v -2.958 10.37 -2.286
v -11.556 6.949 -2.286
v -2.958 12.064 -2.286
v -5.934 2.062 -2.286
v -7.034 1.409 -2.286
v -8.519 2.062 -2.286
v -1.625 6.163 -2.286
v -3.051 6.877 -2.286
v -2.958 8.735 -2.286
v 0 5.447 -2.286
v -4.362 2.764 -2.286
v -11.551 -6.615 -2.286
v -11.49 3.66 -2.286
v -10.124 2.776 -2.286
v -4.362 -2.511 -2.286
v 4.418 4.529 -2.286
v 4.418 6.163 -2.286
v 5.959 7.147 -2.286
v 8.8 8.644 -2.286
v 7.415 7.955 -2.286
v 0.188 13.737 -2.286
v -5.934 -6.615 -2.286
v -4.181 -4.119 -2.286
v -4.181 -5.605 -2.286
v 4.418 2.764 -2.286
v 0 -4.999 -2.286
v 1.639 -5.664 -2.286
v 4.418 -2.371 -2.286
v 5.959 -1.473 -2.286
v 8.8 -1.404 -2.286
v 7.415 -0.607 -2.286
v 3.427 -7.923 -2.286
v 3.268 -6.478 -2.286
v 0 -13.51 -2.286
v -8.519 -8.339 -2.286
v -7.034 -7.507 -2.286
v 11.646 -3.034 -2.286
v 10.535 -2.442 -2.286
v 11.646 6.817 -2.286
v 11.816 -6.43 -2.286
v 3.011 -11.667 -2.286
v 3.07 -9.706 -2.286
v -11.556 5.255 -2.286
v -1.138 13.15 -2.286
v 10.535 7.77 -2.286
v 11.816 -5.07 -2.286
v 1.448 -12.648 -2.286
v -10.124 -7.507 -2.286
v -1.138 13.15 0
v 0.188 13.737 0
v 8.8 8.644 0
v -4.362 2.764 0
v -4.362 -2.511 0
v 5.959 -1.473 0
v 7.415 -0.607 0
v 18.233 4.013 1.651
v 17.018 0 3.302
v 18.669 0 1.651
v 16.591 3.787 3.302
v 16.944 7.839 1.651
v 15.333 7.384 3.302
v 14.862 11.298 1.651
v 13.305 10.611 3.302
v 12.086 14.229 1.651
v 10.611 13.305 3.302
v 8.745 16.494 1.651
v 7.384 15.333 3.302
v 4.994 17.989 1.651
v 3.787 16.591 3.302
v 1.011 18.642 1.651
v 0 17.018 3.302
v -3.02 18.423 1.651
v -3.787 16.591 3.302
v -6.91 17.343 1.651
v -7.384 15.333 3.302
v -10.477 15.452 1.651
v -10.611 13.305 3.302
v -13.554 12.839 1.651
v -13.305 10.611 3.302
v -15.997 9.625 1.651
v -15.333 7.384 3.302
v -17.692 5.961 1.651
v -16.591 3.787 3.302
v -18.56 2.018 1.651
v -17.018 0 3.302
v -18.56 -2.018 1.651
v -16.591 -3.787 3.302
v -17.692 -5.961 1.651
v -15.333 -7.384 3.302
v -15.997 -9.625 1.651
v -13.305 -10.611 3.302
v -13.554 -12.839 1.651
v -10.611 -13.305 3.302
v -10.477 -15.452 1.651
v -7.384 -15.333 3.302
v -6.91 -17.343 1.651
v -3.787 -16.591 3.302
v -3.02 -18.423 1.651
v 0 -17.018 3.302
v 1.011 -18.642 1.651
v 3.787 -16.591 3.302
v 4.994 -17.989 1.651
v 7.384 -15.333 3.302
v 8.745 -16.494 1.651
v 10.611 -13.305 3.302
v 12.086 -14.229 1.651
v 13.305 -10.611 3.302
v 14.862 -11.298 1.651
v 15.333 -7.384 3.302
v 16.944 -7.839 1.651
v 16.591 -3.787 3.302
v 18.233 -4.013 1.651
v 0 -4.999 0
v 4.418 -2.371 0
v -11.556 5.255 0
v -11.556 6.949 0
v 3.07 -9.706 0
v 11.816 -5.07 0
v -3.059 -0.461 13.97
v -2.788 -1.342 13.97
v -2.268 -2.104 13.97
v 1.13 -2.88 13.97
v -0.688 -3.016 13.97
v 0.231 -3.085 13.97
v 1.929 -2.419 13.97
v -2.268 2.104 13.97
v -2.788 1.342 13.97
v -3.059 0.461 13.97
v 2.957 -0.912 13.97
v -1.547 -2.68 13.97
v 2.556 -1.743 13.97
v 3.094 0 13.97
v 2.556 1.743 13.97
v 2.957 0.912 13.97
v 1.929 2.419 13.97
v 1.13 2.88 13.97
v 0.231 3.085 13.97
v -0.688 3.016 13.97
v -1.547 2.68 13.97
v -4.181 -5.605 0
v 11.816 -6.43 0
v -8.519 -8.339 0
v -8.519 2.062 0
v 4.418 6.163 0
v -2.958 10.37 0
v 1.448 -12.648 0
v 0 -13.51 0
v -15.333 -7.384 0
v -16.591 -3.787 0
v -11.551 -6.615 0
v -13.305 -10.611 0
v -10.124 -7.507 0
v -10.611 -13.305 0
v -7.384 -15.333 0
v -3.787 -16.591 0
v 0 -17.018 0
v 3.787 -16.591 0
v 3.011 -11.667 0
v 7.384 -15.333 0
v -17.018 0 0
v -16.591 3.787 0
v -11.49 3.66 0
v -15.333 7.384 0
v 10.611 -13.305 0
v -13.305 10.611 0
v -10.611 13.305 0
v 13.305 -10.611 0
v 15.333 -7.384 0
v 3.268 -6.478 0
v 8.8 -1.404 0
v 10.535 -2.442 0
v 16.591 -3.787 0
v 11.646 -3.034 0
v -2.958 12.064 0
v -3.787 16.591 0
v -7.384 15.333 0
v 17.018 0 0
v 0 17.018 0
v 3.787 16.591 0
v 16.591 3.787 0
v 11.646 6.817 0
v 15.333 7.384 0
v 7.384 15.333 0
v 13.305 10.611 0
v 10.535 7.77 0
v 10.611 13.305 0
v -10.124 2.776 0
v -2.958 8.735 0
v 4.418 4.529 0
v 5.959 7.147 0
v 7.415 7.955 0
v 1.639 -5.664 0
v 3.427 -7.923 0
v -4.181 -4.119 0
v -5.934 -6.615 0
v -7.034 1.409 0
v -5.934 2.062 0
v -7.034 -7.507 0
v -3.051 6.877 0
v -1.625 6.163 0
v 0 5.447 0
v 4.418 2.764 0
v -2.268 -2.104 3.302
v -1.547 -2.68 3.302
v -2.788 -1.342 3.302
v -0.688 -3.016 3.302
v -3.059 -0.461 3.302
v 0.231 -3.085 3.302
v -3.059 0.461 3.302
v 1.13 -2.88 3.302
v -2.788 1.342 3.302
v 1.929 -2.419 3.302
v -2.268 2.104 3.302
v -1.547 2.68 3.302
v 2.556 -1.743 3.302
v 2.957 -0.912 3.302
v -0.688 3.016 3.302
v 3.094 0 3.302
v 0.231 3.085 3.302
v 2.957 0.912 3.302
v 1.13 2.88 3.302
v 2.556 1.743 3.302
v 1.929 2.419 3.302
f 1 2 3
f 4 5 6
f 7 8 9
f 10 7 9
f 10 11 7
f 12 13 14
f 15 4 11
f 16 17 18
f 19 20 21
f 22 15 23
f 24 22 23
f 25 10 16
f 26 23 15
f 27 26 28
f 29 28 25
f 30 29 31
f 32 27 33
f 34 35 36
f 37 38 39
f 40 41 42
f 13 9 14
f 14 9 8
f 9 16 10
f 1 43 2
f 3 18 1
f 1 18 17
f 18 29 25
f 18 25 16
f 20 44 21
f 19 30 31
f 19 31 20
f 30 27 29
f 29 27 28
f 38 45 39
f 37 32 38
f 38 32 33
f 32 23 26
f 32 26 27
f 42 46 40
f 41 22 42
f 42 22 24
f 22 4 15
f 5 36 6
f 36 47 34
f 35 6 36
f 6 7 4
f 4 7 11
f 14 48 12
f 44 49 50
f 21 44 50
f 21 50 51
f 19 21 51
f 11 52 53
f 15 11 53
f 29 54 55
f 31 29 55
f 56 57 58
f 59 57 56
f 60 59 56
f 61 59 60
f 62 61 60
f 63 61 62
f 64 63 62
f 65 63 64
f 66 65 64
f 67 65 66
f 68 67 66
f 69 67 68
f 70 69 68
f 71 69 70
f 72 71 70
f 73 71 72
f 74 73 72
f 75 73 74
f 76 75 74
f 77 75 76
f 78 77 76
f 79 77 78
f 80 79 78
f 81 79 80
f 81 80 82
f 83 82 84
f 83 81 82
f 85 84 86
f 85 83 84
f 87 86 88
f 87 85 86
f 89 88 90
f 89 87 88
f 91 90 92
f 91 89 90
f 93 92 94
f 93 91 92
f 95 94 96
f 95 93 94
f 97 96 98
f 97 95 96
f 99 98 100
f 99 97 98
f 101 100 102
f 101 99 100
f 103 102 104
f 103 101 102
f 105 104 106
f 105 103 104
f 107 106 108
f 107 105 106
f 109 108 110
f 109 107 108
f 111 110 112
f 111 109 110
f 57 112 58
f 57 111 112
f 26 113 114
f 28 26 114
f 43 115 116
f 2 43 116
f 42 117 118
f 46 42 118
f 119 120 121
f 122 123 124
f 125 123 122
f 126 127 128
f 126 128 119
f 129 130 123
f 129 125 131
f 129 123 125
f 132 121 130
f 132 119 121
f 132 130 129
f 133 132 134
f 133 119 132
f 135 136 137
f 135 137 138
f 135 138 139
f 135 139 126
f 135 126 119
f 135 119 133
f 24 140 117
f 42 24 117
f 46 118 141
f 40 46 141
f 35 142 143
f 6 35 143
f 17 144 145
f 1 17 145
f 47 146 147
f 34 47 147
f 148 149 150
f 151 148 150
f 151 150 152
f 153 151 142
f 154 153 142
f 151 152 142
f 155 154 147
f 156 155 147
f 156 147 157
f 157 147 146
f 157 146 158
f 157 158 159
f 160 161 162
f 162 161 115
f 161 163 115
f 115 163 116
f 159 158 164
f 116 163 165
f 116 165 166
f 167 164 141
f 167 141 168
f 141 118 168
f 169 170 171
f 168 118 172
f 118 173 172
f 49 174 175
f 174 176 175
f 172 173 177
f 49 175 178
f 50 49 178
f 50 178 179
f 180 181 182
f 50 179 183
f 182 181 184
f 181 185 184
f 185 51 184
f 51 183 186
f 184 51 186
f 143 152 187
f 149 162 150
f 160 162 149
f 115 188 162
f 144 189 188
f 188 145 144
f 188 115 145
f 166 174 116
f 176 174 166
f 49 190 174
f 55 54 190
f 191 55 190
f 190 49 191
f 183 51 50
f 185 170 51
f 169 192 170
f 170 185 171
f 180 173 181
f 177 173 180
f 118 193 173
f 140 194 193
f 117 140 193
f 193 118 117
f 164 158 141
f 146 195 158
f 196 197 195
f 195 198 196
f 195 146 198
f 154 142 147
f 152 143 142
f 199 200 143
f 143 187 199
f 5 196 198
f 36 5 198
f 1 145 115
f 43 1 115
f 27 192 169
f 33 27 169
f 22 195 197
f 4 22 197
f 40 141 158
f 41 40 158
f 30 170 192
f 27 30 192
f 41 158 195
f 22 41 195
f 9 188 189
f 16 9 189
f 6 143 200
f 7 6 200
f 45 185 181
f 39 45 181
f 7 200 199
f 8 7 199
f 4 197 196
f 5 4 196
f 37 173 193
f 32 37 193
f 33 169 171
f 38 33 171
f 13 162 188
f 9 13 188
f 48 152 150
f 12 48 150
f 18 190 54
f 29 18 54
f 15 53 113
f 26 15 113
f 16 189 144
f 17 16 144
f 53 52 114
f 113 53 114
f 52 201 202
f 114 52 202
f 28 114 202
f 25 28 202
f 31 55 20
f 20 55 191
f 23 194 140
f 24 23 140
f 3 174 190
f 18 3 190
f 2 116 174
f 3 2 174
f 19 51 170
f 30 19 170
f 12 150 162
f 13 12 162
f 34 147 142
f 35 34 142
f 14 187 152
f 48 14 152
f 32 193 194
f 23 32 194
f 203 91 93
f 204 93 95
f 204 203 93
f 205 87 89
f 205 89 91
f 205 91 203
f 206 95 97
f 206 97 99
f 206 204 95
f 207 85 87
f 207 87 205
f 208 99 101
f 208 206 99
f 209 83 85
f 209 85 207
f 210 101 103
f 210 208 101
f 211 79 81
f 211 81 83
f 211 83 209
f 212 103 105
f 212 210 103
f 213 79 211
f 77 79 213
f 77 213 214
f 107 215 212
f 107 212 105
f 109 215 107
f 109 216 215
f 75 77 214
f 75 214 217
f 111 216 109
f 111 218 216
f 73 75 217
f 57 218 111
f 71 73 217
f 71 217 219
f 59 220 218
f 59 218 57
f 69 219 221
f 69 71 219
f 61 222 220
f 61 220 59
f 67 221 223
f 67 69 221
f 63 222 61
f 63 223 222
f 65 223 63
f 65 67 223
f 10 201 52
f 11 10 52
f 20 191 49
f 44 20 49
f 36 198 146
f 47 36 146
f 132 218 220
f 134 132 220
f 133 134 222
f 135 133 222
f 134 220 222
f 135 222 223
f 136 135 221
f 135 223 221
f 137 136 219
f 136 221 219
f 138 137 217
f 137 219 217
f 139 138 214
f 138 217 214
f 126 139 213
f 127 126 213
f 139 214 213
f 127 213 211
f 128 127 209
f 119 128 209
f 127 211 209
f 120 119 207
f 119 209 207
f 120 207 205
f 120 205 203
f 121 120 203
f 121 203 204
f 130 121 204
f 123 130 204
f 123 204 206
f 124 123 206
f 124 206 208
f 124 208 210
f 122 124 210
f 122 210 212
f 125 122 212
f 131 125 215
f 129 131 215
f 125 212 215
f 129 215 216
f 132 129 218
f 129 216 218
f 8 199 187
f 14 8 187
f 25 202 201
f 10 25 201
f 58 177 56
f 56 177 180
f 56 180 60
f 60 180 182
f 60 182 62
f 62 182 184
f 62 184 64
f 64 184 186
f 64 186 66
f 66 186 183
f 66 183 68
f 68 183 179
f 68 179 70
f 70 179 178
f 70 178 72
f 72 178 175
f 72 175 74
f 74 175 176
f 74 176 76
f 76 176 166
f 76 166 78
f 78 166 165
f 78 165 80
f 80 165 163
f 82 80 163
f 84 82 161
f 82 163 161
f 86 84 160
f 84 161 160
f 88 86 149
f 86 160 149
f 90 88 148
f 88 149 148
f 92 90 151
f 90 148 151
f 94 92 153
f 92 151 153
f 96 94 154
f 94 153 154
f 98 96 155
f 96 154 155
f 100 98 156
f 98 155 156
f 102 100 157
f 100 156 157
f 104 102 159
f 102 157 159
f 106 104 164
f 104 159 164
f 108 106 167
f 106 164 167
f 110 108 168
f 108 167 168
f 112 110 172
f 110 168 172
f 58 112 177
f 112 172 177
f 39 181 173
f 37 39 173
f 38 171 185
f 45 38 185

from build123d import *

# Parameters (mm, degrees)
F0_R     = 19.05
F1_DEPTH = 3.302
F2_R     = 3.0940455734
F3_DEPTH = 10.668
F4_SIZE  = 2.032
F7_DEPTH = 2.286


# Not quite as in the source:
# - a fillet or chamfer that OpenCascade refuses, or shapes differently, is made with other operations: its cross-section is extruded or revolved along the edge and cut away or added


with BuildPart() as f1:
    # F0 (on Top) → F1 (new body)
    with BuildSketch(Plane.XY):
        Circle(F0_R)
    extrude(amount=F1_DEPTH)

    # F2 (on face) → F3 (join)
    with BuildSketch(Plane.XY.offset(3.302)):
        Circle(F2_R)
    extrude(amount=F3_DEPTH)

    # F4
    f4_edges = [f1.edges().sort_by_distance(p)[0] for p in [
        (-19.05, 0, 3.302),
    ]]
    chamfer(f4_edges, length=F4_SIZE)

    # F5: chamfer of 2.032 on 1 edges, made by hand

    # F5_s1 → F5_t2 (revolve, cut)
    with BuildSketch(Plane.XZ):
        Polygon((19.05, 2.032), (17.018, 0), (19.05, 0), align=None)
    revolve(axis=Axis((0, 0, 0), (0, 0, 1)), mode=Mode.SUBTRACT)

    # F6 (on face) → F7 (join)
    with BuildSketch(Plane(origin=(0, 0, 0), x_dir=(1, 0, 0), z_dir=(0, 0, -1))):
        Polygon((-10.1241571829, 7.50669837), (-11.5505903959, 6.6151777282), (-11.4901715756, -3.6598756731), (-2.9577685054, -8.7351842692), (4.4179176912, -4.5286850072), (4.4179176912, -6.1632911675), (-2.9577685054, -10.3697904294), (-11.5558920335, -5.255389493), (-11.5558920335, -6.9493146705), (-2.9577685054, -12.0637156069), (5.9589991364, -7.1465903893), (5.9589991364, 1.4732169604), (7.414681837, 0.6073367549), (7.414681837, -7.955128327), (-1.1376237962, -13.150122948), (0.1876302122, -13.7365777045), (8.8004540583, -8.6443684995), (8.8004540583, 1.404343208), (1.6391712, 5.6640716984), (3.2676828559, 6.4783277921), (10.5352541432, 2.4422151037), (10.5352541432, -7.7702743001), (11.6456285548, -6.8170730956), (11.6456285548, 3.0340532394), (3.4269623458, 7.9227425003), (-4.1806832887, 4.1189184412), (-4.1806832887, 5.604787264), (3.0703544617, 9.7057837993), (11.8158220797, 5.0698746927), (11.8158220797, 6.4297318659), (3.0109197833, 11.667130515), (-5.9344387757, 6.6151777282), (-5.9344387757, -2.0622941665), (-7.0335506462, -1.408512122), (-7.0335506462, 7.50669837), (1.4481722892, 12.6481941369), (0, 13.5096069425), (-8.5194194689, 8.338784799), (-8.5194194689, -2.0622941665), (-1.6249895561, -6.1632911675), (-3.0514232349, -6.8765082397), (-10.1241571829, -2.7755110059), align=None)
        Polygon((0, -5.4471737376), (-4.3624499813, -2.7635633014), (-4.3624499813, 2.5107886177), (0, 4.998779855), (4.4179176912, 2.3708806043), (4.4179176912, -2.7635630686), align=None, mode=Mode.SUBTRACT)
    extrude(amount=F7_DEPTH)


solid = f1.part
